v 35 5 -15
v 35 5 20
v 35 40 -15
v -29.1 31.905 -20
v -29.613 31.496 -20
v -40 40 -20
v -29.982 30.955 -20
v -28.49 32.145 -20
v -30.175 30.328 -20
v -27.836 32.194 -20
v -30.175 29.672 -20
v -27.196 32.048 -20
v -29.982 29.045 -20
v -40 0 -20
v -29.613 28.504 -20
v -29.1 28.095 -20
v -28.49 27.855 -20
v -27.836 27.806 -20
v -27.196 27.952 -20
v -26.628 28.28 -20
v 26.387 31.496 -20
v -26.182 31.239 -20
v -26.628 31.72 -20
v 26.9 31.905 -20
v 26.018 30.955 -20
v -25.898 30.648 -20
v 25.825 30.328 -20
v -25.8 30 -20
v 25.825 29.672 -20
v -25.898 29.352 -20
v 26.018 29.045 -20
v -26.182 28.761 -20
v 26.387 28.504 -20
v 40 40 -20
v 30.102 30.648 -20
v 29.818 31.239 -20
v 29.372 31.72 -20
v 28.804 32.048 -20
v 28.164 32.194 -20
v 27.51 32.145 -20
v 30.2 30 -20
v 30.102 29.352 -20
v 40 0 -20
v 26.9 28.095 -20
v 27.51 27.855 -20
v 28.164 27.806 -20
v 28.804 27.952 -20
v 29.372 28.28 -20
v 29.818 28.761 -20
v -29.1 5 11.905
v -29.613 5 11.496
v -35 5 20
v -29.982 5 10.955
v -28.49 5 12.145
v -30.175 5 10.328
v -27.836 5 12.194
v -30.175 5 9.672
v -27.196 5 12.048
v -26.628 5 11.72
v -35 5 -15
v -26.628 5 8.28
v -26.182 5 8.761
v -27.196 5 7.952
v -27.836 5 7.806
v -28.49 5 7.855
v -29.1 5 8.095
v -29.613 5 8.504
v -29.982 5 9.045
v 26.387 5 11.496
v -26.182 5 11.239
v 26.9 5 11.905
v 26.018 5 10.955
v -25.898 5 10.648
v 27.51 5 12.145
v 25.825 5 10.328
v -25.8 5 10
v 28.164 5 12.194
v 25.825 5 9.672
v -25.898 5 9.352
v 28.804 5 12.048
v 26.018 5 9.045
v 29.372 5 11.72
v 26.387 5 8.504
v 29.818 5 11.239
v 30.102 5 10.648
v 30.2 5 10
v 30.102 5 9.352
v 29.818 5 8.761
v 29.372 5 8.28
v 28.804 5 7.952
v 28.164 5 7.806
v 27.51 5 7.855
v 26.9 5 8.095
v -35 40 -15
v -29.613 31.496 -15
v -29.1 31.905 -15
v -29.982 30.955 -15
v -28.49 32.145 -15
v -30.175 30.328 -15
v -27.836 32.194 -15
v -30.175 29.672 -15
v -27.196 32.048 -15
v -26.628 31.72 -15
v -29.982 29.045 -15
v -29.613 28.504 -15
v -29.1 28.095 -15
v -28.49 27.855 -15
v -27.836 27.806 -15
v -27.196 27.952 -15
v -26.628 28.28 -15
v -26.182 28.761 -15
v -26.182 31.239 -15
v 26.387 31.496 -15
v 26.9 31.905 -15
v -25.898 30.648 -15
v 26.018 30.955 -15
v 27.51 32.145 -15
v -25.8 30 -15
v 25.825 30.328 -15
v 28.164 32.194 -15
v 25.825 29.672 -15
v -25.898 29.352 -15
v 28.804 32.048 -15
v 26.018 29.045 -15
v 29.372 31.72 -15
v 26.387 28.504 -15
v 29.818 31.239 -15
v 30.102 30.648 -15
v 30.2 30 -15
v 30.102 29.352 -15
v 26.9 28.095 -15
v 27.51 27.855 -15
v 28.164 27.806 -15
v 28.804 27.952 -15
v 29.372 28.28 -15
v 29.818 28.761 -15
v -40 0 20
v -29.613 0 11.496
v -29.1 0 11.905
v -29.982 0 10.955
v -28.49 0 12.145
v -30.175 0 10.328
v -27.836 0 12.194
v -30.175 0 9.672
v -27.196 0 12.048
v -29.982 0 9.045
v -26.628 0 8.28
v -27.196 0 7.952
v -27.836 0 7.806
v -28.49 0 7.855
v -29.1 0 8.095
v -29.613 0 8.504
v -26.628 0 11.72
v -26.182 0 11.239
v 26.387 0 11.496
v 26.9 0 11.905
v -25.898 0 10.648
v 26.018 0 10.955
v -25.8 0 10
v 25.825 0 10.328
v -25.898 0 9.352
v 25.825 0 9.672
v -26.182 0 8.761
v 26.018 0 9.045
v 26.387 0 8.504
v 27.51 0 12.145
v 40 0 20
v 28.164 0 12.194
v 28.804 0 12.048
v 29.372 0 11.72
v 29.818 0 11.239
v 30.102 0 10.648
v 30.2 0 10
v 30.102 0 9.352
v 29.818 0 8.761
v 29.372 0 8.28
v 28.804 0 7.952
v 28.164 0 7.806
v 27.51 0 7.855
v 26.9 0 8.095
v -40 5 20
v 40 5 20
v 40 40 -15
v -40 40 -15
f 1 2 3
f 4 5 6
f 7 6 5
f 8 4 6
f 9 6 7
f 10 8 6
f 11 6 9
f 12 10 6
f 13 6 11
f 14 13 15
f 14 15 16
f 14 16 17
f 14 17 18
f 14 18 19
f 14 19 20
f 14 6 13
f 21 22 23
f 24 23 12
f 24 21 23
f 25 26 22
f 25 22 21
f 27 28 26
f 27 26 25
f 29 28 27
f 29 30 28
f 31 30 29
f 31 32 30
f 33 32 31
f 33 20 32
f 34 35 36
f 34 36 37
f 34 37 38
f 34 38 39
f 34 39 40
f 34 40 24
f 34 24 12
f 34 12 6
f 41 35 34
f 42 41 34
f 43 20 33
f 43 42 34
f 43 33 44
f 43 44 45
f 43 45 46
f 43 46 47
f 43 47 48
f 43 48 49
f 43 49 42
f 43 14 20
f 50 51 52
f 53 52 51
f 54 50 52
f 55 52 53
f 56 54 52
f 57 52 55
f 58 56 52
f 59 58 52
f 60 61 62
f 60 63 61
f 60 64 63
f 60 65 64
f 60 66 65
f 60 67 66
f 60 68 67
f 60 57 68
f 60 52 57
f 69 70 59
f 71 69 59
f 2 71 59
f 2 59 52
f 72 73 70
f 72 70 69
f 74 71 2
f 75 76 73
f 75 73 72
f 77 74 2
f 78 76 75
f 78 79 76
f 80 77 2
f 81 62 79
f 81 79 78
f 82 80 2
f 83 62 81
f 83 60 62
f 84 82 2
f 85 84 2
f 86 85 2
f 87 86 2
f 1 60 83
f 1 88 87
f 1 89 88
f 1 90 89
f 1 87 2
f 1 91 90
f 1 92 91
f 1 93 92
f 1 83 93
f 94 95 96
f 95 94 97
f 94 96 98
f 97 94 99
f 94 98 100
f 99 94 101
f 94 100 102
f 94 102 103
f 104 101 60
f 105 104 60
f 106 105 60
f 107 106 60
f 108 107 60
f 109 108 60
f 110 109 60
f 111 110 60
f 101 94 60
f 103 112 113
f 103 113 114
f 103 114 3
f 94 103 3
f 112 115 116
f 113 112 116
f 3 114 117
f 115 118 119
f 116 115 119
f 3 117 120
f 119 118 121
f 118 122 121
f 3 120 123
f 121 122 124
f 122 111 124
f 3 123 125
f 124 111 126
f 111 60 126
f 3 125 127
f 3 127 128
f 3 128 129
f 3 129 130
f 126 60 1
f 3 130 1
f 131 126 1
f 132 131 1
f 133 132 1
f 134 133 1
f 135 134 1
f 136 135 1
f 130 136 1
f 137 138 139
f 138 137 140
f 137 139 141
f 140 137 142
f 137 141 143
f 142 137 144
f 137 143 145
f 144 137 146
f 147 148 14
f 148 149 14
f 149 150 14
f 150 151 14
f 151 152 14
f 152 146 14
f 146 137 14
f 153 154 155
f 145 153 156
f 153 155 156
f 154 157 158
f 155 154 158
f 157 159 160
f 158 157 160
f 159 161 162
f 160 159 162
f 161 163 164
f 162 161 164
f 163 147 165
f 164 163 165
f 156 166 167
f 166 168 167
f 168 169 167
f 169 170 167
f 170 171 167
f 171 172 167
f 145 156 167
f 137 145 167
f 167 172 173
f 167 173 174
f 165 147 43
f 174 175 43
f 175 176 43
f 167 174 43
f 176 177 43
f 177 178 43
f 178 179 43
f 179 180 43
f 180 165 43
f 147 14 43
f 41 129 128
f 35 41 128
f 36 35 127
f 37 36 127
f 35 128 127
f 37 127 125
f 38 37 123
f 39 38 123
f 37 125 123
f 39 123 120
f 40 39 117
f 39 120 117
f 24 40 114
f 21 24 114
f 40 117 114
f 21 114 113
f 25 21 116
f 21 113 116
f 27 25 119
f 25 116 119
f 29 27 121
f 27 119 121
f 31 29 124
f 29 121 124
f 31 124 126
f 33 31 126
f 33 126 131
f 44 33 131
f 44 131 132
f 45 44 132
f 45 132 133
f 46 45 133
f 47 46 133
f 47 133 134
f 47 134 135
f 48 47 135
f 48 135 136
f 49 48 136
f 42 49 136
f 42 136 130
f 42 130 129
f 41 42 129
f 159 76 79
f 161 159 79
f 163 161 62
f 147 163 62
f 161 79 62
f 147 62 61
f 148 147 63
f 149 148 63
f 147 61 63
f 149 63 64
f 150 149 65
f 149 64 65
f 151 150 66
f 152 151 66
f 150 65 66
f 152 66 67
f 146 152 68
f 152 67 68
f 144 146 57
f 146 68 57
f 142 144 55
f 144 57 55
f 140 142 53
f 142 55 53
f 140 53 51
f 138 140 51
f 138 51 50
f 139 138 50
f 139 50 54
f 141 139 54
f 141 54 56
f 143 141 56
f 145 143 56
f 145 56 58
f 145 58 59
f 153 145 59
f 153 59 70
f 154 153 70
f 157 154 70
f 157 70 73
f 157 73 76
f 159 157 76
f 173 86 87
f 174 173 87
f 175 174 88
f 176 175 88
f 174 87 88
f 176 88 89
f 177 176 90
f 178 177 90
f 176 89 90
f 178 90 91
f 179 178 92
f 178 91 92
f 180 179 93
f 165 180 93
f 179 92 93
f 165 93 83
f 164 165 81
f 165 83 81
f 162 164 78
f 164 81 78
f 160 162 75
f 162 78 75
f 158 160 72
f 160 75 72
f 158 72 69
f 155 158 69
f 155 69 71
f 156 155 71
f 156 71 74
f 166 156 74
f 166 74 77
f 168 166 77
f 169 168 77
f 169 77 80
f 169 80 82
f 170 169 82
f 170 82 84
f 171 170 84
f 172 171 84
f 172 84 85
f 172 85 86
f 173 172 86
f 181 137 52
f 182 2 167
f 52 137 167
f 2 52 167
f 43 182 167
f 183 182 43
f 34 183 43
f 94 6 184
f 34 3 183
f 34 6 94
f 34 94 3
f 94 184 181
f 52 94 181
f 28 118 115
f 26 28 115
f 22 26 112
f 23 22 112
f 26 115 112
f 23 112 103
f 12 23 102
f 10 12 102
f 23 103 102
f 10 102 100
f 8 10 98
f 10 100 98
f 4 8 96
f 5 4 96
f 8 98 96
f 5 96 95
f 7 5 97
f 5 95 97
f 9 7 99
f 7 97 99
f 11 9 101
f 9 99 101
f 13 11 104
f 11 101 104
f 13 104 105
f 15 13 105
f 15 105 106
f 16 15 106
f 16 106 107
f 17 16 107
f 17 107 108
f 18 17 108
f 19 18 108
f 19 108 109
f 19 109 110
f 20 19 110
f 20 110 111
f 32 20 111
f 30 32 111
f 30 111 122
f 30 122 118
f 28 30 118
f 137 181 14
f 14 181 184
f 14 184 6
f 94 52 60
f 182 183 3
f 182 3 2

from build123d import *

# Parameters (mm, degrees)
SKETCH1_W           = 80
SKETCH1_H           = 40
BOSS_EXTRUDE1_DEPTH = 5
SKETCH2_W           = 80
SKETCH2_H           = 5
BOSS_EXTRUDE2_DEPTH = 35
BOSS_EXTRUDE3_DEPTH = 5
BOSS_EXTRUDE4_DEPTH = 5
SKETCH5_R           = 2.2
CUT_EXTRUDE1_DEPTH  = 6
SKETCH6_R           = 2.2
CUT_EXTRUDE2_DEPTH  = 6


with BuildPart() as part:
    # Sketch1 → Boss-Extrude1 (new body)
    with BuildSketch(Plane(origin=(0, 0, 0), x_dir=(1, 0, 0), z_dir=(0, 1, 0))):
        Rectangle(SKETCH1_W, SKETCH1_H)
    extrude(amount=BOSS_EXTRUDE1_DEPTH)

    # Sketch2 → Boss-Extrude2 (add)
    with BuildSketch(Plane(origin=(0, 5, 0), x_dir=(1, 0, 0), z_dir=(0, 1, 0))):
        with Locations((0, 17.5)):
            Rectangle(SKETCH2_W, SKETCH2_H)
    extrude(amount=BOSS_EXTRUDE2_DEPTH)

    # Sketch3 → Boss-Extrude3 (add)
    with BuildSketch(Plane.ZY.offset(40)):
        Polygon((-15, 40), (20, 5), (-15, 5), align=None)
    extrude(amount=-BOSS_EXTRUDE3_DEPTH)

    # Sketch4 → Boss-Extrude4 (add)
    with BuildSketch(Plane(origin=(40, 0, 0), x_dir=(0, 0, -1), z_dir=(1, 0, 0))):
        Polygon((15, 40), (-20, 5), (15, 5), align=None)
    extrude(amount=-BOSS_EXTRUDE4_DEPTH)

    # Sketch5 → Cut-Extrude1 (cut, through all)
    with BuildSketch(Plane(origin=(0, 5, 0), x_dir=(1, 0, 0), z_dir=(0, 1, 0))):
        with Locations((-28, -10)):
            Circle(SKETCH5_R)
        with Locations((28, -10)):
            Circle(SKETCH5_R)
    extrude(amount=-CUT_EXTRUDE1_DEPTH, mode=Mode.SUBTRACT)

    # Sketch6 → Cut-Extrude2 (cut, through all)
    with BuildSketch(Plane.XY.offset(-15)):
        with Locations((-28, 30)):
            Circle(SKETCH6_R)
        with Locations((28, 30)):
            Circle(SKETCH6_R)
    extrude(amount=-CUT_EXTRUDE2_DEPTH, mode=Mode.SUBTRACT)


solid = part.part
